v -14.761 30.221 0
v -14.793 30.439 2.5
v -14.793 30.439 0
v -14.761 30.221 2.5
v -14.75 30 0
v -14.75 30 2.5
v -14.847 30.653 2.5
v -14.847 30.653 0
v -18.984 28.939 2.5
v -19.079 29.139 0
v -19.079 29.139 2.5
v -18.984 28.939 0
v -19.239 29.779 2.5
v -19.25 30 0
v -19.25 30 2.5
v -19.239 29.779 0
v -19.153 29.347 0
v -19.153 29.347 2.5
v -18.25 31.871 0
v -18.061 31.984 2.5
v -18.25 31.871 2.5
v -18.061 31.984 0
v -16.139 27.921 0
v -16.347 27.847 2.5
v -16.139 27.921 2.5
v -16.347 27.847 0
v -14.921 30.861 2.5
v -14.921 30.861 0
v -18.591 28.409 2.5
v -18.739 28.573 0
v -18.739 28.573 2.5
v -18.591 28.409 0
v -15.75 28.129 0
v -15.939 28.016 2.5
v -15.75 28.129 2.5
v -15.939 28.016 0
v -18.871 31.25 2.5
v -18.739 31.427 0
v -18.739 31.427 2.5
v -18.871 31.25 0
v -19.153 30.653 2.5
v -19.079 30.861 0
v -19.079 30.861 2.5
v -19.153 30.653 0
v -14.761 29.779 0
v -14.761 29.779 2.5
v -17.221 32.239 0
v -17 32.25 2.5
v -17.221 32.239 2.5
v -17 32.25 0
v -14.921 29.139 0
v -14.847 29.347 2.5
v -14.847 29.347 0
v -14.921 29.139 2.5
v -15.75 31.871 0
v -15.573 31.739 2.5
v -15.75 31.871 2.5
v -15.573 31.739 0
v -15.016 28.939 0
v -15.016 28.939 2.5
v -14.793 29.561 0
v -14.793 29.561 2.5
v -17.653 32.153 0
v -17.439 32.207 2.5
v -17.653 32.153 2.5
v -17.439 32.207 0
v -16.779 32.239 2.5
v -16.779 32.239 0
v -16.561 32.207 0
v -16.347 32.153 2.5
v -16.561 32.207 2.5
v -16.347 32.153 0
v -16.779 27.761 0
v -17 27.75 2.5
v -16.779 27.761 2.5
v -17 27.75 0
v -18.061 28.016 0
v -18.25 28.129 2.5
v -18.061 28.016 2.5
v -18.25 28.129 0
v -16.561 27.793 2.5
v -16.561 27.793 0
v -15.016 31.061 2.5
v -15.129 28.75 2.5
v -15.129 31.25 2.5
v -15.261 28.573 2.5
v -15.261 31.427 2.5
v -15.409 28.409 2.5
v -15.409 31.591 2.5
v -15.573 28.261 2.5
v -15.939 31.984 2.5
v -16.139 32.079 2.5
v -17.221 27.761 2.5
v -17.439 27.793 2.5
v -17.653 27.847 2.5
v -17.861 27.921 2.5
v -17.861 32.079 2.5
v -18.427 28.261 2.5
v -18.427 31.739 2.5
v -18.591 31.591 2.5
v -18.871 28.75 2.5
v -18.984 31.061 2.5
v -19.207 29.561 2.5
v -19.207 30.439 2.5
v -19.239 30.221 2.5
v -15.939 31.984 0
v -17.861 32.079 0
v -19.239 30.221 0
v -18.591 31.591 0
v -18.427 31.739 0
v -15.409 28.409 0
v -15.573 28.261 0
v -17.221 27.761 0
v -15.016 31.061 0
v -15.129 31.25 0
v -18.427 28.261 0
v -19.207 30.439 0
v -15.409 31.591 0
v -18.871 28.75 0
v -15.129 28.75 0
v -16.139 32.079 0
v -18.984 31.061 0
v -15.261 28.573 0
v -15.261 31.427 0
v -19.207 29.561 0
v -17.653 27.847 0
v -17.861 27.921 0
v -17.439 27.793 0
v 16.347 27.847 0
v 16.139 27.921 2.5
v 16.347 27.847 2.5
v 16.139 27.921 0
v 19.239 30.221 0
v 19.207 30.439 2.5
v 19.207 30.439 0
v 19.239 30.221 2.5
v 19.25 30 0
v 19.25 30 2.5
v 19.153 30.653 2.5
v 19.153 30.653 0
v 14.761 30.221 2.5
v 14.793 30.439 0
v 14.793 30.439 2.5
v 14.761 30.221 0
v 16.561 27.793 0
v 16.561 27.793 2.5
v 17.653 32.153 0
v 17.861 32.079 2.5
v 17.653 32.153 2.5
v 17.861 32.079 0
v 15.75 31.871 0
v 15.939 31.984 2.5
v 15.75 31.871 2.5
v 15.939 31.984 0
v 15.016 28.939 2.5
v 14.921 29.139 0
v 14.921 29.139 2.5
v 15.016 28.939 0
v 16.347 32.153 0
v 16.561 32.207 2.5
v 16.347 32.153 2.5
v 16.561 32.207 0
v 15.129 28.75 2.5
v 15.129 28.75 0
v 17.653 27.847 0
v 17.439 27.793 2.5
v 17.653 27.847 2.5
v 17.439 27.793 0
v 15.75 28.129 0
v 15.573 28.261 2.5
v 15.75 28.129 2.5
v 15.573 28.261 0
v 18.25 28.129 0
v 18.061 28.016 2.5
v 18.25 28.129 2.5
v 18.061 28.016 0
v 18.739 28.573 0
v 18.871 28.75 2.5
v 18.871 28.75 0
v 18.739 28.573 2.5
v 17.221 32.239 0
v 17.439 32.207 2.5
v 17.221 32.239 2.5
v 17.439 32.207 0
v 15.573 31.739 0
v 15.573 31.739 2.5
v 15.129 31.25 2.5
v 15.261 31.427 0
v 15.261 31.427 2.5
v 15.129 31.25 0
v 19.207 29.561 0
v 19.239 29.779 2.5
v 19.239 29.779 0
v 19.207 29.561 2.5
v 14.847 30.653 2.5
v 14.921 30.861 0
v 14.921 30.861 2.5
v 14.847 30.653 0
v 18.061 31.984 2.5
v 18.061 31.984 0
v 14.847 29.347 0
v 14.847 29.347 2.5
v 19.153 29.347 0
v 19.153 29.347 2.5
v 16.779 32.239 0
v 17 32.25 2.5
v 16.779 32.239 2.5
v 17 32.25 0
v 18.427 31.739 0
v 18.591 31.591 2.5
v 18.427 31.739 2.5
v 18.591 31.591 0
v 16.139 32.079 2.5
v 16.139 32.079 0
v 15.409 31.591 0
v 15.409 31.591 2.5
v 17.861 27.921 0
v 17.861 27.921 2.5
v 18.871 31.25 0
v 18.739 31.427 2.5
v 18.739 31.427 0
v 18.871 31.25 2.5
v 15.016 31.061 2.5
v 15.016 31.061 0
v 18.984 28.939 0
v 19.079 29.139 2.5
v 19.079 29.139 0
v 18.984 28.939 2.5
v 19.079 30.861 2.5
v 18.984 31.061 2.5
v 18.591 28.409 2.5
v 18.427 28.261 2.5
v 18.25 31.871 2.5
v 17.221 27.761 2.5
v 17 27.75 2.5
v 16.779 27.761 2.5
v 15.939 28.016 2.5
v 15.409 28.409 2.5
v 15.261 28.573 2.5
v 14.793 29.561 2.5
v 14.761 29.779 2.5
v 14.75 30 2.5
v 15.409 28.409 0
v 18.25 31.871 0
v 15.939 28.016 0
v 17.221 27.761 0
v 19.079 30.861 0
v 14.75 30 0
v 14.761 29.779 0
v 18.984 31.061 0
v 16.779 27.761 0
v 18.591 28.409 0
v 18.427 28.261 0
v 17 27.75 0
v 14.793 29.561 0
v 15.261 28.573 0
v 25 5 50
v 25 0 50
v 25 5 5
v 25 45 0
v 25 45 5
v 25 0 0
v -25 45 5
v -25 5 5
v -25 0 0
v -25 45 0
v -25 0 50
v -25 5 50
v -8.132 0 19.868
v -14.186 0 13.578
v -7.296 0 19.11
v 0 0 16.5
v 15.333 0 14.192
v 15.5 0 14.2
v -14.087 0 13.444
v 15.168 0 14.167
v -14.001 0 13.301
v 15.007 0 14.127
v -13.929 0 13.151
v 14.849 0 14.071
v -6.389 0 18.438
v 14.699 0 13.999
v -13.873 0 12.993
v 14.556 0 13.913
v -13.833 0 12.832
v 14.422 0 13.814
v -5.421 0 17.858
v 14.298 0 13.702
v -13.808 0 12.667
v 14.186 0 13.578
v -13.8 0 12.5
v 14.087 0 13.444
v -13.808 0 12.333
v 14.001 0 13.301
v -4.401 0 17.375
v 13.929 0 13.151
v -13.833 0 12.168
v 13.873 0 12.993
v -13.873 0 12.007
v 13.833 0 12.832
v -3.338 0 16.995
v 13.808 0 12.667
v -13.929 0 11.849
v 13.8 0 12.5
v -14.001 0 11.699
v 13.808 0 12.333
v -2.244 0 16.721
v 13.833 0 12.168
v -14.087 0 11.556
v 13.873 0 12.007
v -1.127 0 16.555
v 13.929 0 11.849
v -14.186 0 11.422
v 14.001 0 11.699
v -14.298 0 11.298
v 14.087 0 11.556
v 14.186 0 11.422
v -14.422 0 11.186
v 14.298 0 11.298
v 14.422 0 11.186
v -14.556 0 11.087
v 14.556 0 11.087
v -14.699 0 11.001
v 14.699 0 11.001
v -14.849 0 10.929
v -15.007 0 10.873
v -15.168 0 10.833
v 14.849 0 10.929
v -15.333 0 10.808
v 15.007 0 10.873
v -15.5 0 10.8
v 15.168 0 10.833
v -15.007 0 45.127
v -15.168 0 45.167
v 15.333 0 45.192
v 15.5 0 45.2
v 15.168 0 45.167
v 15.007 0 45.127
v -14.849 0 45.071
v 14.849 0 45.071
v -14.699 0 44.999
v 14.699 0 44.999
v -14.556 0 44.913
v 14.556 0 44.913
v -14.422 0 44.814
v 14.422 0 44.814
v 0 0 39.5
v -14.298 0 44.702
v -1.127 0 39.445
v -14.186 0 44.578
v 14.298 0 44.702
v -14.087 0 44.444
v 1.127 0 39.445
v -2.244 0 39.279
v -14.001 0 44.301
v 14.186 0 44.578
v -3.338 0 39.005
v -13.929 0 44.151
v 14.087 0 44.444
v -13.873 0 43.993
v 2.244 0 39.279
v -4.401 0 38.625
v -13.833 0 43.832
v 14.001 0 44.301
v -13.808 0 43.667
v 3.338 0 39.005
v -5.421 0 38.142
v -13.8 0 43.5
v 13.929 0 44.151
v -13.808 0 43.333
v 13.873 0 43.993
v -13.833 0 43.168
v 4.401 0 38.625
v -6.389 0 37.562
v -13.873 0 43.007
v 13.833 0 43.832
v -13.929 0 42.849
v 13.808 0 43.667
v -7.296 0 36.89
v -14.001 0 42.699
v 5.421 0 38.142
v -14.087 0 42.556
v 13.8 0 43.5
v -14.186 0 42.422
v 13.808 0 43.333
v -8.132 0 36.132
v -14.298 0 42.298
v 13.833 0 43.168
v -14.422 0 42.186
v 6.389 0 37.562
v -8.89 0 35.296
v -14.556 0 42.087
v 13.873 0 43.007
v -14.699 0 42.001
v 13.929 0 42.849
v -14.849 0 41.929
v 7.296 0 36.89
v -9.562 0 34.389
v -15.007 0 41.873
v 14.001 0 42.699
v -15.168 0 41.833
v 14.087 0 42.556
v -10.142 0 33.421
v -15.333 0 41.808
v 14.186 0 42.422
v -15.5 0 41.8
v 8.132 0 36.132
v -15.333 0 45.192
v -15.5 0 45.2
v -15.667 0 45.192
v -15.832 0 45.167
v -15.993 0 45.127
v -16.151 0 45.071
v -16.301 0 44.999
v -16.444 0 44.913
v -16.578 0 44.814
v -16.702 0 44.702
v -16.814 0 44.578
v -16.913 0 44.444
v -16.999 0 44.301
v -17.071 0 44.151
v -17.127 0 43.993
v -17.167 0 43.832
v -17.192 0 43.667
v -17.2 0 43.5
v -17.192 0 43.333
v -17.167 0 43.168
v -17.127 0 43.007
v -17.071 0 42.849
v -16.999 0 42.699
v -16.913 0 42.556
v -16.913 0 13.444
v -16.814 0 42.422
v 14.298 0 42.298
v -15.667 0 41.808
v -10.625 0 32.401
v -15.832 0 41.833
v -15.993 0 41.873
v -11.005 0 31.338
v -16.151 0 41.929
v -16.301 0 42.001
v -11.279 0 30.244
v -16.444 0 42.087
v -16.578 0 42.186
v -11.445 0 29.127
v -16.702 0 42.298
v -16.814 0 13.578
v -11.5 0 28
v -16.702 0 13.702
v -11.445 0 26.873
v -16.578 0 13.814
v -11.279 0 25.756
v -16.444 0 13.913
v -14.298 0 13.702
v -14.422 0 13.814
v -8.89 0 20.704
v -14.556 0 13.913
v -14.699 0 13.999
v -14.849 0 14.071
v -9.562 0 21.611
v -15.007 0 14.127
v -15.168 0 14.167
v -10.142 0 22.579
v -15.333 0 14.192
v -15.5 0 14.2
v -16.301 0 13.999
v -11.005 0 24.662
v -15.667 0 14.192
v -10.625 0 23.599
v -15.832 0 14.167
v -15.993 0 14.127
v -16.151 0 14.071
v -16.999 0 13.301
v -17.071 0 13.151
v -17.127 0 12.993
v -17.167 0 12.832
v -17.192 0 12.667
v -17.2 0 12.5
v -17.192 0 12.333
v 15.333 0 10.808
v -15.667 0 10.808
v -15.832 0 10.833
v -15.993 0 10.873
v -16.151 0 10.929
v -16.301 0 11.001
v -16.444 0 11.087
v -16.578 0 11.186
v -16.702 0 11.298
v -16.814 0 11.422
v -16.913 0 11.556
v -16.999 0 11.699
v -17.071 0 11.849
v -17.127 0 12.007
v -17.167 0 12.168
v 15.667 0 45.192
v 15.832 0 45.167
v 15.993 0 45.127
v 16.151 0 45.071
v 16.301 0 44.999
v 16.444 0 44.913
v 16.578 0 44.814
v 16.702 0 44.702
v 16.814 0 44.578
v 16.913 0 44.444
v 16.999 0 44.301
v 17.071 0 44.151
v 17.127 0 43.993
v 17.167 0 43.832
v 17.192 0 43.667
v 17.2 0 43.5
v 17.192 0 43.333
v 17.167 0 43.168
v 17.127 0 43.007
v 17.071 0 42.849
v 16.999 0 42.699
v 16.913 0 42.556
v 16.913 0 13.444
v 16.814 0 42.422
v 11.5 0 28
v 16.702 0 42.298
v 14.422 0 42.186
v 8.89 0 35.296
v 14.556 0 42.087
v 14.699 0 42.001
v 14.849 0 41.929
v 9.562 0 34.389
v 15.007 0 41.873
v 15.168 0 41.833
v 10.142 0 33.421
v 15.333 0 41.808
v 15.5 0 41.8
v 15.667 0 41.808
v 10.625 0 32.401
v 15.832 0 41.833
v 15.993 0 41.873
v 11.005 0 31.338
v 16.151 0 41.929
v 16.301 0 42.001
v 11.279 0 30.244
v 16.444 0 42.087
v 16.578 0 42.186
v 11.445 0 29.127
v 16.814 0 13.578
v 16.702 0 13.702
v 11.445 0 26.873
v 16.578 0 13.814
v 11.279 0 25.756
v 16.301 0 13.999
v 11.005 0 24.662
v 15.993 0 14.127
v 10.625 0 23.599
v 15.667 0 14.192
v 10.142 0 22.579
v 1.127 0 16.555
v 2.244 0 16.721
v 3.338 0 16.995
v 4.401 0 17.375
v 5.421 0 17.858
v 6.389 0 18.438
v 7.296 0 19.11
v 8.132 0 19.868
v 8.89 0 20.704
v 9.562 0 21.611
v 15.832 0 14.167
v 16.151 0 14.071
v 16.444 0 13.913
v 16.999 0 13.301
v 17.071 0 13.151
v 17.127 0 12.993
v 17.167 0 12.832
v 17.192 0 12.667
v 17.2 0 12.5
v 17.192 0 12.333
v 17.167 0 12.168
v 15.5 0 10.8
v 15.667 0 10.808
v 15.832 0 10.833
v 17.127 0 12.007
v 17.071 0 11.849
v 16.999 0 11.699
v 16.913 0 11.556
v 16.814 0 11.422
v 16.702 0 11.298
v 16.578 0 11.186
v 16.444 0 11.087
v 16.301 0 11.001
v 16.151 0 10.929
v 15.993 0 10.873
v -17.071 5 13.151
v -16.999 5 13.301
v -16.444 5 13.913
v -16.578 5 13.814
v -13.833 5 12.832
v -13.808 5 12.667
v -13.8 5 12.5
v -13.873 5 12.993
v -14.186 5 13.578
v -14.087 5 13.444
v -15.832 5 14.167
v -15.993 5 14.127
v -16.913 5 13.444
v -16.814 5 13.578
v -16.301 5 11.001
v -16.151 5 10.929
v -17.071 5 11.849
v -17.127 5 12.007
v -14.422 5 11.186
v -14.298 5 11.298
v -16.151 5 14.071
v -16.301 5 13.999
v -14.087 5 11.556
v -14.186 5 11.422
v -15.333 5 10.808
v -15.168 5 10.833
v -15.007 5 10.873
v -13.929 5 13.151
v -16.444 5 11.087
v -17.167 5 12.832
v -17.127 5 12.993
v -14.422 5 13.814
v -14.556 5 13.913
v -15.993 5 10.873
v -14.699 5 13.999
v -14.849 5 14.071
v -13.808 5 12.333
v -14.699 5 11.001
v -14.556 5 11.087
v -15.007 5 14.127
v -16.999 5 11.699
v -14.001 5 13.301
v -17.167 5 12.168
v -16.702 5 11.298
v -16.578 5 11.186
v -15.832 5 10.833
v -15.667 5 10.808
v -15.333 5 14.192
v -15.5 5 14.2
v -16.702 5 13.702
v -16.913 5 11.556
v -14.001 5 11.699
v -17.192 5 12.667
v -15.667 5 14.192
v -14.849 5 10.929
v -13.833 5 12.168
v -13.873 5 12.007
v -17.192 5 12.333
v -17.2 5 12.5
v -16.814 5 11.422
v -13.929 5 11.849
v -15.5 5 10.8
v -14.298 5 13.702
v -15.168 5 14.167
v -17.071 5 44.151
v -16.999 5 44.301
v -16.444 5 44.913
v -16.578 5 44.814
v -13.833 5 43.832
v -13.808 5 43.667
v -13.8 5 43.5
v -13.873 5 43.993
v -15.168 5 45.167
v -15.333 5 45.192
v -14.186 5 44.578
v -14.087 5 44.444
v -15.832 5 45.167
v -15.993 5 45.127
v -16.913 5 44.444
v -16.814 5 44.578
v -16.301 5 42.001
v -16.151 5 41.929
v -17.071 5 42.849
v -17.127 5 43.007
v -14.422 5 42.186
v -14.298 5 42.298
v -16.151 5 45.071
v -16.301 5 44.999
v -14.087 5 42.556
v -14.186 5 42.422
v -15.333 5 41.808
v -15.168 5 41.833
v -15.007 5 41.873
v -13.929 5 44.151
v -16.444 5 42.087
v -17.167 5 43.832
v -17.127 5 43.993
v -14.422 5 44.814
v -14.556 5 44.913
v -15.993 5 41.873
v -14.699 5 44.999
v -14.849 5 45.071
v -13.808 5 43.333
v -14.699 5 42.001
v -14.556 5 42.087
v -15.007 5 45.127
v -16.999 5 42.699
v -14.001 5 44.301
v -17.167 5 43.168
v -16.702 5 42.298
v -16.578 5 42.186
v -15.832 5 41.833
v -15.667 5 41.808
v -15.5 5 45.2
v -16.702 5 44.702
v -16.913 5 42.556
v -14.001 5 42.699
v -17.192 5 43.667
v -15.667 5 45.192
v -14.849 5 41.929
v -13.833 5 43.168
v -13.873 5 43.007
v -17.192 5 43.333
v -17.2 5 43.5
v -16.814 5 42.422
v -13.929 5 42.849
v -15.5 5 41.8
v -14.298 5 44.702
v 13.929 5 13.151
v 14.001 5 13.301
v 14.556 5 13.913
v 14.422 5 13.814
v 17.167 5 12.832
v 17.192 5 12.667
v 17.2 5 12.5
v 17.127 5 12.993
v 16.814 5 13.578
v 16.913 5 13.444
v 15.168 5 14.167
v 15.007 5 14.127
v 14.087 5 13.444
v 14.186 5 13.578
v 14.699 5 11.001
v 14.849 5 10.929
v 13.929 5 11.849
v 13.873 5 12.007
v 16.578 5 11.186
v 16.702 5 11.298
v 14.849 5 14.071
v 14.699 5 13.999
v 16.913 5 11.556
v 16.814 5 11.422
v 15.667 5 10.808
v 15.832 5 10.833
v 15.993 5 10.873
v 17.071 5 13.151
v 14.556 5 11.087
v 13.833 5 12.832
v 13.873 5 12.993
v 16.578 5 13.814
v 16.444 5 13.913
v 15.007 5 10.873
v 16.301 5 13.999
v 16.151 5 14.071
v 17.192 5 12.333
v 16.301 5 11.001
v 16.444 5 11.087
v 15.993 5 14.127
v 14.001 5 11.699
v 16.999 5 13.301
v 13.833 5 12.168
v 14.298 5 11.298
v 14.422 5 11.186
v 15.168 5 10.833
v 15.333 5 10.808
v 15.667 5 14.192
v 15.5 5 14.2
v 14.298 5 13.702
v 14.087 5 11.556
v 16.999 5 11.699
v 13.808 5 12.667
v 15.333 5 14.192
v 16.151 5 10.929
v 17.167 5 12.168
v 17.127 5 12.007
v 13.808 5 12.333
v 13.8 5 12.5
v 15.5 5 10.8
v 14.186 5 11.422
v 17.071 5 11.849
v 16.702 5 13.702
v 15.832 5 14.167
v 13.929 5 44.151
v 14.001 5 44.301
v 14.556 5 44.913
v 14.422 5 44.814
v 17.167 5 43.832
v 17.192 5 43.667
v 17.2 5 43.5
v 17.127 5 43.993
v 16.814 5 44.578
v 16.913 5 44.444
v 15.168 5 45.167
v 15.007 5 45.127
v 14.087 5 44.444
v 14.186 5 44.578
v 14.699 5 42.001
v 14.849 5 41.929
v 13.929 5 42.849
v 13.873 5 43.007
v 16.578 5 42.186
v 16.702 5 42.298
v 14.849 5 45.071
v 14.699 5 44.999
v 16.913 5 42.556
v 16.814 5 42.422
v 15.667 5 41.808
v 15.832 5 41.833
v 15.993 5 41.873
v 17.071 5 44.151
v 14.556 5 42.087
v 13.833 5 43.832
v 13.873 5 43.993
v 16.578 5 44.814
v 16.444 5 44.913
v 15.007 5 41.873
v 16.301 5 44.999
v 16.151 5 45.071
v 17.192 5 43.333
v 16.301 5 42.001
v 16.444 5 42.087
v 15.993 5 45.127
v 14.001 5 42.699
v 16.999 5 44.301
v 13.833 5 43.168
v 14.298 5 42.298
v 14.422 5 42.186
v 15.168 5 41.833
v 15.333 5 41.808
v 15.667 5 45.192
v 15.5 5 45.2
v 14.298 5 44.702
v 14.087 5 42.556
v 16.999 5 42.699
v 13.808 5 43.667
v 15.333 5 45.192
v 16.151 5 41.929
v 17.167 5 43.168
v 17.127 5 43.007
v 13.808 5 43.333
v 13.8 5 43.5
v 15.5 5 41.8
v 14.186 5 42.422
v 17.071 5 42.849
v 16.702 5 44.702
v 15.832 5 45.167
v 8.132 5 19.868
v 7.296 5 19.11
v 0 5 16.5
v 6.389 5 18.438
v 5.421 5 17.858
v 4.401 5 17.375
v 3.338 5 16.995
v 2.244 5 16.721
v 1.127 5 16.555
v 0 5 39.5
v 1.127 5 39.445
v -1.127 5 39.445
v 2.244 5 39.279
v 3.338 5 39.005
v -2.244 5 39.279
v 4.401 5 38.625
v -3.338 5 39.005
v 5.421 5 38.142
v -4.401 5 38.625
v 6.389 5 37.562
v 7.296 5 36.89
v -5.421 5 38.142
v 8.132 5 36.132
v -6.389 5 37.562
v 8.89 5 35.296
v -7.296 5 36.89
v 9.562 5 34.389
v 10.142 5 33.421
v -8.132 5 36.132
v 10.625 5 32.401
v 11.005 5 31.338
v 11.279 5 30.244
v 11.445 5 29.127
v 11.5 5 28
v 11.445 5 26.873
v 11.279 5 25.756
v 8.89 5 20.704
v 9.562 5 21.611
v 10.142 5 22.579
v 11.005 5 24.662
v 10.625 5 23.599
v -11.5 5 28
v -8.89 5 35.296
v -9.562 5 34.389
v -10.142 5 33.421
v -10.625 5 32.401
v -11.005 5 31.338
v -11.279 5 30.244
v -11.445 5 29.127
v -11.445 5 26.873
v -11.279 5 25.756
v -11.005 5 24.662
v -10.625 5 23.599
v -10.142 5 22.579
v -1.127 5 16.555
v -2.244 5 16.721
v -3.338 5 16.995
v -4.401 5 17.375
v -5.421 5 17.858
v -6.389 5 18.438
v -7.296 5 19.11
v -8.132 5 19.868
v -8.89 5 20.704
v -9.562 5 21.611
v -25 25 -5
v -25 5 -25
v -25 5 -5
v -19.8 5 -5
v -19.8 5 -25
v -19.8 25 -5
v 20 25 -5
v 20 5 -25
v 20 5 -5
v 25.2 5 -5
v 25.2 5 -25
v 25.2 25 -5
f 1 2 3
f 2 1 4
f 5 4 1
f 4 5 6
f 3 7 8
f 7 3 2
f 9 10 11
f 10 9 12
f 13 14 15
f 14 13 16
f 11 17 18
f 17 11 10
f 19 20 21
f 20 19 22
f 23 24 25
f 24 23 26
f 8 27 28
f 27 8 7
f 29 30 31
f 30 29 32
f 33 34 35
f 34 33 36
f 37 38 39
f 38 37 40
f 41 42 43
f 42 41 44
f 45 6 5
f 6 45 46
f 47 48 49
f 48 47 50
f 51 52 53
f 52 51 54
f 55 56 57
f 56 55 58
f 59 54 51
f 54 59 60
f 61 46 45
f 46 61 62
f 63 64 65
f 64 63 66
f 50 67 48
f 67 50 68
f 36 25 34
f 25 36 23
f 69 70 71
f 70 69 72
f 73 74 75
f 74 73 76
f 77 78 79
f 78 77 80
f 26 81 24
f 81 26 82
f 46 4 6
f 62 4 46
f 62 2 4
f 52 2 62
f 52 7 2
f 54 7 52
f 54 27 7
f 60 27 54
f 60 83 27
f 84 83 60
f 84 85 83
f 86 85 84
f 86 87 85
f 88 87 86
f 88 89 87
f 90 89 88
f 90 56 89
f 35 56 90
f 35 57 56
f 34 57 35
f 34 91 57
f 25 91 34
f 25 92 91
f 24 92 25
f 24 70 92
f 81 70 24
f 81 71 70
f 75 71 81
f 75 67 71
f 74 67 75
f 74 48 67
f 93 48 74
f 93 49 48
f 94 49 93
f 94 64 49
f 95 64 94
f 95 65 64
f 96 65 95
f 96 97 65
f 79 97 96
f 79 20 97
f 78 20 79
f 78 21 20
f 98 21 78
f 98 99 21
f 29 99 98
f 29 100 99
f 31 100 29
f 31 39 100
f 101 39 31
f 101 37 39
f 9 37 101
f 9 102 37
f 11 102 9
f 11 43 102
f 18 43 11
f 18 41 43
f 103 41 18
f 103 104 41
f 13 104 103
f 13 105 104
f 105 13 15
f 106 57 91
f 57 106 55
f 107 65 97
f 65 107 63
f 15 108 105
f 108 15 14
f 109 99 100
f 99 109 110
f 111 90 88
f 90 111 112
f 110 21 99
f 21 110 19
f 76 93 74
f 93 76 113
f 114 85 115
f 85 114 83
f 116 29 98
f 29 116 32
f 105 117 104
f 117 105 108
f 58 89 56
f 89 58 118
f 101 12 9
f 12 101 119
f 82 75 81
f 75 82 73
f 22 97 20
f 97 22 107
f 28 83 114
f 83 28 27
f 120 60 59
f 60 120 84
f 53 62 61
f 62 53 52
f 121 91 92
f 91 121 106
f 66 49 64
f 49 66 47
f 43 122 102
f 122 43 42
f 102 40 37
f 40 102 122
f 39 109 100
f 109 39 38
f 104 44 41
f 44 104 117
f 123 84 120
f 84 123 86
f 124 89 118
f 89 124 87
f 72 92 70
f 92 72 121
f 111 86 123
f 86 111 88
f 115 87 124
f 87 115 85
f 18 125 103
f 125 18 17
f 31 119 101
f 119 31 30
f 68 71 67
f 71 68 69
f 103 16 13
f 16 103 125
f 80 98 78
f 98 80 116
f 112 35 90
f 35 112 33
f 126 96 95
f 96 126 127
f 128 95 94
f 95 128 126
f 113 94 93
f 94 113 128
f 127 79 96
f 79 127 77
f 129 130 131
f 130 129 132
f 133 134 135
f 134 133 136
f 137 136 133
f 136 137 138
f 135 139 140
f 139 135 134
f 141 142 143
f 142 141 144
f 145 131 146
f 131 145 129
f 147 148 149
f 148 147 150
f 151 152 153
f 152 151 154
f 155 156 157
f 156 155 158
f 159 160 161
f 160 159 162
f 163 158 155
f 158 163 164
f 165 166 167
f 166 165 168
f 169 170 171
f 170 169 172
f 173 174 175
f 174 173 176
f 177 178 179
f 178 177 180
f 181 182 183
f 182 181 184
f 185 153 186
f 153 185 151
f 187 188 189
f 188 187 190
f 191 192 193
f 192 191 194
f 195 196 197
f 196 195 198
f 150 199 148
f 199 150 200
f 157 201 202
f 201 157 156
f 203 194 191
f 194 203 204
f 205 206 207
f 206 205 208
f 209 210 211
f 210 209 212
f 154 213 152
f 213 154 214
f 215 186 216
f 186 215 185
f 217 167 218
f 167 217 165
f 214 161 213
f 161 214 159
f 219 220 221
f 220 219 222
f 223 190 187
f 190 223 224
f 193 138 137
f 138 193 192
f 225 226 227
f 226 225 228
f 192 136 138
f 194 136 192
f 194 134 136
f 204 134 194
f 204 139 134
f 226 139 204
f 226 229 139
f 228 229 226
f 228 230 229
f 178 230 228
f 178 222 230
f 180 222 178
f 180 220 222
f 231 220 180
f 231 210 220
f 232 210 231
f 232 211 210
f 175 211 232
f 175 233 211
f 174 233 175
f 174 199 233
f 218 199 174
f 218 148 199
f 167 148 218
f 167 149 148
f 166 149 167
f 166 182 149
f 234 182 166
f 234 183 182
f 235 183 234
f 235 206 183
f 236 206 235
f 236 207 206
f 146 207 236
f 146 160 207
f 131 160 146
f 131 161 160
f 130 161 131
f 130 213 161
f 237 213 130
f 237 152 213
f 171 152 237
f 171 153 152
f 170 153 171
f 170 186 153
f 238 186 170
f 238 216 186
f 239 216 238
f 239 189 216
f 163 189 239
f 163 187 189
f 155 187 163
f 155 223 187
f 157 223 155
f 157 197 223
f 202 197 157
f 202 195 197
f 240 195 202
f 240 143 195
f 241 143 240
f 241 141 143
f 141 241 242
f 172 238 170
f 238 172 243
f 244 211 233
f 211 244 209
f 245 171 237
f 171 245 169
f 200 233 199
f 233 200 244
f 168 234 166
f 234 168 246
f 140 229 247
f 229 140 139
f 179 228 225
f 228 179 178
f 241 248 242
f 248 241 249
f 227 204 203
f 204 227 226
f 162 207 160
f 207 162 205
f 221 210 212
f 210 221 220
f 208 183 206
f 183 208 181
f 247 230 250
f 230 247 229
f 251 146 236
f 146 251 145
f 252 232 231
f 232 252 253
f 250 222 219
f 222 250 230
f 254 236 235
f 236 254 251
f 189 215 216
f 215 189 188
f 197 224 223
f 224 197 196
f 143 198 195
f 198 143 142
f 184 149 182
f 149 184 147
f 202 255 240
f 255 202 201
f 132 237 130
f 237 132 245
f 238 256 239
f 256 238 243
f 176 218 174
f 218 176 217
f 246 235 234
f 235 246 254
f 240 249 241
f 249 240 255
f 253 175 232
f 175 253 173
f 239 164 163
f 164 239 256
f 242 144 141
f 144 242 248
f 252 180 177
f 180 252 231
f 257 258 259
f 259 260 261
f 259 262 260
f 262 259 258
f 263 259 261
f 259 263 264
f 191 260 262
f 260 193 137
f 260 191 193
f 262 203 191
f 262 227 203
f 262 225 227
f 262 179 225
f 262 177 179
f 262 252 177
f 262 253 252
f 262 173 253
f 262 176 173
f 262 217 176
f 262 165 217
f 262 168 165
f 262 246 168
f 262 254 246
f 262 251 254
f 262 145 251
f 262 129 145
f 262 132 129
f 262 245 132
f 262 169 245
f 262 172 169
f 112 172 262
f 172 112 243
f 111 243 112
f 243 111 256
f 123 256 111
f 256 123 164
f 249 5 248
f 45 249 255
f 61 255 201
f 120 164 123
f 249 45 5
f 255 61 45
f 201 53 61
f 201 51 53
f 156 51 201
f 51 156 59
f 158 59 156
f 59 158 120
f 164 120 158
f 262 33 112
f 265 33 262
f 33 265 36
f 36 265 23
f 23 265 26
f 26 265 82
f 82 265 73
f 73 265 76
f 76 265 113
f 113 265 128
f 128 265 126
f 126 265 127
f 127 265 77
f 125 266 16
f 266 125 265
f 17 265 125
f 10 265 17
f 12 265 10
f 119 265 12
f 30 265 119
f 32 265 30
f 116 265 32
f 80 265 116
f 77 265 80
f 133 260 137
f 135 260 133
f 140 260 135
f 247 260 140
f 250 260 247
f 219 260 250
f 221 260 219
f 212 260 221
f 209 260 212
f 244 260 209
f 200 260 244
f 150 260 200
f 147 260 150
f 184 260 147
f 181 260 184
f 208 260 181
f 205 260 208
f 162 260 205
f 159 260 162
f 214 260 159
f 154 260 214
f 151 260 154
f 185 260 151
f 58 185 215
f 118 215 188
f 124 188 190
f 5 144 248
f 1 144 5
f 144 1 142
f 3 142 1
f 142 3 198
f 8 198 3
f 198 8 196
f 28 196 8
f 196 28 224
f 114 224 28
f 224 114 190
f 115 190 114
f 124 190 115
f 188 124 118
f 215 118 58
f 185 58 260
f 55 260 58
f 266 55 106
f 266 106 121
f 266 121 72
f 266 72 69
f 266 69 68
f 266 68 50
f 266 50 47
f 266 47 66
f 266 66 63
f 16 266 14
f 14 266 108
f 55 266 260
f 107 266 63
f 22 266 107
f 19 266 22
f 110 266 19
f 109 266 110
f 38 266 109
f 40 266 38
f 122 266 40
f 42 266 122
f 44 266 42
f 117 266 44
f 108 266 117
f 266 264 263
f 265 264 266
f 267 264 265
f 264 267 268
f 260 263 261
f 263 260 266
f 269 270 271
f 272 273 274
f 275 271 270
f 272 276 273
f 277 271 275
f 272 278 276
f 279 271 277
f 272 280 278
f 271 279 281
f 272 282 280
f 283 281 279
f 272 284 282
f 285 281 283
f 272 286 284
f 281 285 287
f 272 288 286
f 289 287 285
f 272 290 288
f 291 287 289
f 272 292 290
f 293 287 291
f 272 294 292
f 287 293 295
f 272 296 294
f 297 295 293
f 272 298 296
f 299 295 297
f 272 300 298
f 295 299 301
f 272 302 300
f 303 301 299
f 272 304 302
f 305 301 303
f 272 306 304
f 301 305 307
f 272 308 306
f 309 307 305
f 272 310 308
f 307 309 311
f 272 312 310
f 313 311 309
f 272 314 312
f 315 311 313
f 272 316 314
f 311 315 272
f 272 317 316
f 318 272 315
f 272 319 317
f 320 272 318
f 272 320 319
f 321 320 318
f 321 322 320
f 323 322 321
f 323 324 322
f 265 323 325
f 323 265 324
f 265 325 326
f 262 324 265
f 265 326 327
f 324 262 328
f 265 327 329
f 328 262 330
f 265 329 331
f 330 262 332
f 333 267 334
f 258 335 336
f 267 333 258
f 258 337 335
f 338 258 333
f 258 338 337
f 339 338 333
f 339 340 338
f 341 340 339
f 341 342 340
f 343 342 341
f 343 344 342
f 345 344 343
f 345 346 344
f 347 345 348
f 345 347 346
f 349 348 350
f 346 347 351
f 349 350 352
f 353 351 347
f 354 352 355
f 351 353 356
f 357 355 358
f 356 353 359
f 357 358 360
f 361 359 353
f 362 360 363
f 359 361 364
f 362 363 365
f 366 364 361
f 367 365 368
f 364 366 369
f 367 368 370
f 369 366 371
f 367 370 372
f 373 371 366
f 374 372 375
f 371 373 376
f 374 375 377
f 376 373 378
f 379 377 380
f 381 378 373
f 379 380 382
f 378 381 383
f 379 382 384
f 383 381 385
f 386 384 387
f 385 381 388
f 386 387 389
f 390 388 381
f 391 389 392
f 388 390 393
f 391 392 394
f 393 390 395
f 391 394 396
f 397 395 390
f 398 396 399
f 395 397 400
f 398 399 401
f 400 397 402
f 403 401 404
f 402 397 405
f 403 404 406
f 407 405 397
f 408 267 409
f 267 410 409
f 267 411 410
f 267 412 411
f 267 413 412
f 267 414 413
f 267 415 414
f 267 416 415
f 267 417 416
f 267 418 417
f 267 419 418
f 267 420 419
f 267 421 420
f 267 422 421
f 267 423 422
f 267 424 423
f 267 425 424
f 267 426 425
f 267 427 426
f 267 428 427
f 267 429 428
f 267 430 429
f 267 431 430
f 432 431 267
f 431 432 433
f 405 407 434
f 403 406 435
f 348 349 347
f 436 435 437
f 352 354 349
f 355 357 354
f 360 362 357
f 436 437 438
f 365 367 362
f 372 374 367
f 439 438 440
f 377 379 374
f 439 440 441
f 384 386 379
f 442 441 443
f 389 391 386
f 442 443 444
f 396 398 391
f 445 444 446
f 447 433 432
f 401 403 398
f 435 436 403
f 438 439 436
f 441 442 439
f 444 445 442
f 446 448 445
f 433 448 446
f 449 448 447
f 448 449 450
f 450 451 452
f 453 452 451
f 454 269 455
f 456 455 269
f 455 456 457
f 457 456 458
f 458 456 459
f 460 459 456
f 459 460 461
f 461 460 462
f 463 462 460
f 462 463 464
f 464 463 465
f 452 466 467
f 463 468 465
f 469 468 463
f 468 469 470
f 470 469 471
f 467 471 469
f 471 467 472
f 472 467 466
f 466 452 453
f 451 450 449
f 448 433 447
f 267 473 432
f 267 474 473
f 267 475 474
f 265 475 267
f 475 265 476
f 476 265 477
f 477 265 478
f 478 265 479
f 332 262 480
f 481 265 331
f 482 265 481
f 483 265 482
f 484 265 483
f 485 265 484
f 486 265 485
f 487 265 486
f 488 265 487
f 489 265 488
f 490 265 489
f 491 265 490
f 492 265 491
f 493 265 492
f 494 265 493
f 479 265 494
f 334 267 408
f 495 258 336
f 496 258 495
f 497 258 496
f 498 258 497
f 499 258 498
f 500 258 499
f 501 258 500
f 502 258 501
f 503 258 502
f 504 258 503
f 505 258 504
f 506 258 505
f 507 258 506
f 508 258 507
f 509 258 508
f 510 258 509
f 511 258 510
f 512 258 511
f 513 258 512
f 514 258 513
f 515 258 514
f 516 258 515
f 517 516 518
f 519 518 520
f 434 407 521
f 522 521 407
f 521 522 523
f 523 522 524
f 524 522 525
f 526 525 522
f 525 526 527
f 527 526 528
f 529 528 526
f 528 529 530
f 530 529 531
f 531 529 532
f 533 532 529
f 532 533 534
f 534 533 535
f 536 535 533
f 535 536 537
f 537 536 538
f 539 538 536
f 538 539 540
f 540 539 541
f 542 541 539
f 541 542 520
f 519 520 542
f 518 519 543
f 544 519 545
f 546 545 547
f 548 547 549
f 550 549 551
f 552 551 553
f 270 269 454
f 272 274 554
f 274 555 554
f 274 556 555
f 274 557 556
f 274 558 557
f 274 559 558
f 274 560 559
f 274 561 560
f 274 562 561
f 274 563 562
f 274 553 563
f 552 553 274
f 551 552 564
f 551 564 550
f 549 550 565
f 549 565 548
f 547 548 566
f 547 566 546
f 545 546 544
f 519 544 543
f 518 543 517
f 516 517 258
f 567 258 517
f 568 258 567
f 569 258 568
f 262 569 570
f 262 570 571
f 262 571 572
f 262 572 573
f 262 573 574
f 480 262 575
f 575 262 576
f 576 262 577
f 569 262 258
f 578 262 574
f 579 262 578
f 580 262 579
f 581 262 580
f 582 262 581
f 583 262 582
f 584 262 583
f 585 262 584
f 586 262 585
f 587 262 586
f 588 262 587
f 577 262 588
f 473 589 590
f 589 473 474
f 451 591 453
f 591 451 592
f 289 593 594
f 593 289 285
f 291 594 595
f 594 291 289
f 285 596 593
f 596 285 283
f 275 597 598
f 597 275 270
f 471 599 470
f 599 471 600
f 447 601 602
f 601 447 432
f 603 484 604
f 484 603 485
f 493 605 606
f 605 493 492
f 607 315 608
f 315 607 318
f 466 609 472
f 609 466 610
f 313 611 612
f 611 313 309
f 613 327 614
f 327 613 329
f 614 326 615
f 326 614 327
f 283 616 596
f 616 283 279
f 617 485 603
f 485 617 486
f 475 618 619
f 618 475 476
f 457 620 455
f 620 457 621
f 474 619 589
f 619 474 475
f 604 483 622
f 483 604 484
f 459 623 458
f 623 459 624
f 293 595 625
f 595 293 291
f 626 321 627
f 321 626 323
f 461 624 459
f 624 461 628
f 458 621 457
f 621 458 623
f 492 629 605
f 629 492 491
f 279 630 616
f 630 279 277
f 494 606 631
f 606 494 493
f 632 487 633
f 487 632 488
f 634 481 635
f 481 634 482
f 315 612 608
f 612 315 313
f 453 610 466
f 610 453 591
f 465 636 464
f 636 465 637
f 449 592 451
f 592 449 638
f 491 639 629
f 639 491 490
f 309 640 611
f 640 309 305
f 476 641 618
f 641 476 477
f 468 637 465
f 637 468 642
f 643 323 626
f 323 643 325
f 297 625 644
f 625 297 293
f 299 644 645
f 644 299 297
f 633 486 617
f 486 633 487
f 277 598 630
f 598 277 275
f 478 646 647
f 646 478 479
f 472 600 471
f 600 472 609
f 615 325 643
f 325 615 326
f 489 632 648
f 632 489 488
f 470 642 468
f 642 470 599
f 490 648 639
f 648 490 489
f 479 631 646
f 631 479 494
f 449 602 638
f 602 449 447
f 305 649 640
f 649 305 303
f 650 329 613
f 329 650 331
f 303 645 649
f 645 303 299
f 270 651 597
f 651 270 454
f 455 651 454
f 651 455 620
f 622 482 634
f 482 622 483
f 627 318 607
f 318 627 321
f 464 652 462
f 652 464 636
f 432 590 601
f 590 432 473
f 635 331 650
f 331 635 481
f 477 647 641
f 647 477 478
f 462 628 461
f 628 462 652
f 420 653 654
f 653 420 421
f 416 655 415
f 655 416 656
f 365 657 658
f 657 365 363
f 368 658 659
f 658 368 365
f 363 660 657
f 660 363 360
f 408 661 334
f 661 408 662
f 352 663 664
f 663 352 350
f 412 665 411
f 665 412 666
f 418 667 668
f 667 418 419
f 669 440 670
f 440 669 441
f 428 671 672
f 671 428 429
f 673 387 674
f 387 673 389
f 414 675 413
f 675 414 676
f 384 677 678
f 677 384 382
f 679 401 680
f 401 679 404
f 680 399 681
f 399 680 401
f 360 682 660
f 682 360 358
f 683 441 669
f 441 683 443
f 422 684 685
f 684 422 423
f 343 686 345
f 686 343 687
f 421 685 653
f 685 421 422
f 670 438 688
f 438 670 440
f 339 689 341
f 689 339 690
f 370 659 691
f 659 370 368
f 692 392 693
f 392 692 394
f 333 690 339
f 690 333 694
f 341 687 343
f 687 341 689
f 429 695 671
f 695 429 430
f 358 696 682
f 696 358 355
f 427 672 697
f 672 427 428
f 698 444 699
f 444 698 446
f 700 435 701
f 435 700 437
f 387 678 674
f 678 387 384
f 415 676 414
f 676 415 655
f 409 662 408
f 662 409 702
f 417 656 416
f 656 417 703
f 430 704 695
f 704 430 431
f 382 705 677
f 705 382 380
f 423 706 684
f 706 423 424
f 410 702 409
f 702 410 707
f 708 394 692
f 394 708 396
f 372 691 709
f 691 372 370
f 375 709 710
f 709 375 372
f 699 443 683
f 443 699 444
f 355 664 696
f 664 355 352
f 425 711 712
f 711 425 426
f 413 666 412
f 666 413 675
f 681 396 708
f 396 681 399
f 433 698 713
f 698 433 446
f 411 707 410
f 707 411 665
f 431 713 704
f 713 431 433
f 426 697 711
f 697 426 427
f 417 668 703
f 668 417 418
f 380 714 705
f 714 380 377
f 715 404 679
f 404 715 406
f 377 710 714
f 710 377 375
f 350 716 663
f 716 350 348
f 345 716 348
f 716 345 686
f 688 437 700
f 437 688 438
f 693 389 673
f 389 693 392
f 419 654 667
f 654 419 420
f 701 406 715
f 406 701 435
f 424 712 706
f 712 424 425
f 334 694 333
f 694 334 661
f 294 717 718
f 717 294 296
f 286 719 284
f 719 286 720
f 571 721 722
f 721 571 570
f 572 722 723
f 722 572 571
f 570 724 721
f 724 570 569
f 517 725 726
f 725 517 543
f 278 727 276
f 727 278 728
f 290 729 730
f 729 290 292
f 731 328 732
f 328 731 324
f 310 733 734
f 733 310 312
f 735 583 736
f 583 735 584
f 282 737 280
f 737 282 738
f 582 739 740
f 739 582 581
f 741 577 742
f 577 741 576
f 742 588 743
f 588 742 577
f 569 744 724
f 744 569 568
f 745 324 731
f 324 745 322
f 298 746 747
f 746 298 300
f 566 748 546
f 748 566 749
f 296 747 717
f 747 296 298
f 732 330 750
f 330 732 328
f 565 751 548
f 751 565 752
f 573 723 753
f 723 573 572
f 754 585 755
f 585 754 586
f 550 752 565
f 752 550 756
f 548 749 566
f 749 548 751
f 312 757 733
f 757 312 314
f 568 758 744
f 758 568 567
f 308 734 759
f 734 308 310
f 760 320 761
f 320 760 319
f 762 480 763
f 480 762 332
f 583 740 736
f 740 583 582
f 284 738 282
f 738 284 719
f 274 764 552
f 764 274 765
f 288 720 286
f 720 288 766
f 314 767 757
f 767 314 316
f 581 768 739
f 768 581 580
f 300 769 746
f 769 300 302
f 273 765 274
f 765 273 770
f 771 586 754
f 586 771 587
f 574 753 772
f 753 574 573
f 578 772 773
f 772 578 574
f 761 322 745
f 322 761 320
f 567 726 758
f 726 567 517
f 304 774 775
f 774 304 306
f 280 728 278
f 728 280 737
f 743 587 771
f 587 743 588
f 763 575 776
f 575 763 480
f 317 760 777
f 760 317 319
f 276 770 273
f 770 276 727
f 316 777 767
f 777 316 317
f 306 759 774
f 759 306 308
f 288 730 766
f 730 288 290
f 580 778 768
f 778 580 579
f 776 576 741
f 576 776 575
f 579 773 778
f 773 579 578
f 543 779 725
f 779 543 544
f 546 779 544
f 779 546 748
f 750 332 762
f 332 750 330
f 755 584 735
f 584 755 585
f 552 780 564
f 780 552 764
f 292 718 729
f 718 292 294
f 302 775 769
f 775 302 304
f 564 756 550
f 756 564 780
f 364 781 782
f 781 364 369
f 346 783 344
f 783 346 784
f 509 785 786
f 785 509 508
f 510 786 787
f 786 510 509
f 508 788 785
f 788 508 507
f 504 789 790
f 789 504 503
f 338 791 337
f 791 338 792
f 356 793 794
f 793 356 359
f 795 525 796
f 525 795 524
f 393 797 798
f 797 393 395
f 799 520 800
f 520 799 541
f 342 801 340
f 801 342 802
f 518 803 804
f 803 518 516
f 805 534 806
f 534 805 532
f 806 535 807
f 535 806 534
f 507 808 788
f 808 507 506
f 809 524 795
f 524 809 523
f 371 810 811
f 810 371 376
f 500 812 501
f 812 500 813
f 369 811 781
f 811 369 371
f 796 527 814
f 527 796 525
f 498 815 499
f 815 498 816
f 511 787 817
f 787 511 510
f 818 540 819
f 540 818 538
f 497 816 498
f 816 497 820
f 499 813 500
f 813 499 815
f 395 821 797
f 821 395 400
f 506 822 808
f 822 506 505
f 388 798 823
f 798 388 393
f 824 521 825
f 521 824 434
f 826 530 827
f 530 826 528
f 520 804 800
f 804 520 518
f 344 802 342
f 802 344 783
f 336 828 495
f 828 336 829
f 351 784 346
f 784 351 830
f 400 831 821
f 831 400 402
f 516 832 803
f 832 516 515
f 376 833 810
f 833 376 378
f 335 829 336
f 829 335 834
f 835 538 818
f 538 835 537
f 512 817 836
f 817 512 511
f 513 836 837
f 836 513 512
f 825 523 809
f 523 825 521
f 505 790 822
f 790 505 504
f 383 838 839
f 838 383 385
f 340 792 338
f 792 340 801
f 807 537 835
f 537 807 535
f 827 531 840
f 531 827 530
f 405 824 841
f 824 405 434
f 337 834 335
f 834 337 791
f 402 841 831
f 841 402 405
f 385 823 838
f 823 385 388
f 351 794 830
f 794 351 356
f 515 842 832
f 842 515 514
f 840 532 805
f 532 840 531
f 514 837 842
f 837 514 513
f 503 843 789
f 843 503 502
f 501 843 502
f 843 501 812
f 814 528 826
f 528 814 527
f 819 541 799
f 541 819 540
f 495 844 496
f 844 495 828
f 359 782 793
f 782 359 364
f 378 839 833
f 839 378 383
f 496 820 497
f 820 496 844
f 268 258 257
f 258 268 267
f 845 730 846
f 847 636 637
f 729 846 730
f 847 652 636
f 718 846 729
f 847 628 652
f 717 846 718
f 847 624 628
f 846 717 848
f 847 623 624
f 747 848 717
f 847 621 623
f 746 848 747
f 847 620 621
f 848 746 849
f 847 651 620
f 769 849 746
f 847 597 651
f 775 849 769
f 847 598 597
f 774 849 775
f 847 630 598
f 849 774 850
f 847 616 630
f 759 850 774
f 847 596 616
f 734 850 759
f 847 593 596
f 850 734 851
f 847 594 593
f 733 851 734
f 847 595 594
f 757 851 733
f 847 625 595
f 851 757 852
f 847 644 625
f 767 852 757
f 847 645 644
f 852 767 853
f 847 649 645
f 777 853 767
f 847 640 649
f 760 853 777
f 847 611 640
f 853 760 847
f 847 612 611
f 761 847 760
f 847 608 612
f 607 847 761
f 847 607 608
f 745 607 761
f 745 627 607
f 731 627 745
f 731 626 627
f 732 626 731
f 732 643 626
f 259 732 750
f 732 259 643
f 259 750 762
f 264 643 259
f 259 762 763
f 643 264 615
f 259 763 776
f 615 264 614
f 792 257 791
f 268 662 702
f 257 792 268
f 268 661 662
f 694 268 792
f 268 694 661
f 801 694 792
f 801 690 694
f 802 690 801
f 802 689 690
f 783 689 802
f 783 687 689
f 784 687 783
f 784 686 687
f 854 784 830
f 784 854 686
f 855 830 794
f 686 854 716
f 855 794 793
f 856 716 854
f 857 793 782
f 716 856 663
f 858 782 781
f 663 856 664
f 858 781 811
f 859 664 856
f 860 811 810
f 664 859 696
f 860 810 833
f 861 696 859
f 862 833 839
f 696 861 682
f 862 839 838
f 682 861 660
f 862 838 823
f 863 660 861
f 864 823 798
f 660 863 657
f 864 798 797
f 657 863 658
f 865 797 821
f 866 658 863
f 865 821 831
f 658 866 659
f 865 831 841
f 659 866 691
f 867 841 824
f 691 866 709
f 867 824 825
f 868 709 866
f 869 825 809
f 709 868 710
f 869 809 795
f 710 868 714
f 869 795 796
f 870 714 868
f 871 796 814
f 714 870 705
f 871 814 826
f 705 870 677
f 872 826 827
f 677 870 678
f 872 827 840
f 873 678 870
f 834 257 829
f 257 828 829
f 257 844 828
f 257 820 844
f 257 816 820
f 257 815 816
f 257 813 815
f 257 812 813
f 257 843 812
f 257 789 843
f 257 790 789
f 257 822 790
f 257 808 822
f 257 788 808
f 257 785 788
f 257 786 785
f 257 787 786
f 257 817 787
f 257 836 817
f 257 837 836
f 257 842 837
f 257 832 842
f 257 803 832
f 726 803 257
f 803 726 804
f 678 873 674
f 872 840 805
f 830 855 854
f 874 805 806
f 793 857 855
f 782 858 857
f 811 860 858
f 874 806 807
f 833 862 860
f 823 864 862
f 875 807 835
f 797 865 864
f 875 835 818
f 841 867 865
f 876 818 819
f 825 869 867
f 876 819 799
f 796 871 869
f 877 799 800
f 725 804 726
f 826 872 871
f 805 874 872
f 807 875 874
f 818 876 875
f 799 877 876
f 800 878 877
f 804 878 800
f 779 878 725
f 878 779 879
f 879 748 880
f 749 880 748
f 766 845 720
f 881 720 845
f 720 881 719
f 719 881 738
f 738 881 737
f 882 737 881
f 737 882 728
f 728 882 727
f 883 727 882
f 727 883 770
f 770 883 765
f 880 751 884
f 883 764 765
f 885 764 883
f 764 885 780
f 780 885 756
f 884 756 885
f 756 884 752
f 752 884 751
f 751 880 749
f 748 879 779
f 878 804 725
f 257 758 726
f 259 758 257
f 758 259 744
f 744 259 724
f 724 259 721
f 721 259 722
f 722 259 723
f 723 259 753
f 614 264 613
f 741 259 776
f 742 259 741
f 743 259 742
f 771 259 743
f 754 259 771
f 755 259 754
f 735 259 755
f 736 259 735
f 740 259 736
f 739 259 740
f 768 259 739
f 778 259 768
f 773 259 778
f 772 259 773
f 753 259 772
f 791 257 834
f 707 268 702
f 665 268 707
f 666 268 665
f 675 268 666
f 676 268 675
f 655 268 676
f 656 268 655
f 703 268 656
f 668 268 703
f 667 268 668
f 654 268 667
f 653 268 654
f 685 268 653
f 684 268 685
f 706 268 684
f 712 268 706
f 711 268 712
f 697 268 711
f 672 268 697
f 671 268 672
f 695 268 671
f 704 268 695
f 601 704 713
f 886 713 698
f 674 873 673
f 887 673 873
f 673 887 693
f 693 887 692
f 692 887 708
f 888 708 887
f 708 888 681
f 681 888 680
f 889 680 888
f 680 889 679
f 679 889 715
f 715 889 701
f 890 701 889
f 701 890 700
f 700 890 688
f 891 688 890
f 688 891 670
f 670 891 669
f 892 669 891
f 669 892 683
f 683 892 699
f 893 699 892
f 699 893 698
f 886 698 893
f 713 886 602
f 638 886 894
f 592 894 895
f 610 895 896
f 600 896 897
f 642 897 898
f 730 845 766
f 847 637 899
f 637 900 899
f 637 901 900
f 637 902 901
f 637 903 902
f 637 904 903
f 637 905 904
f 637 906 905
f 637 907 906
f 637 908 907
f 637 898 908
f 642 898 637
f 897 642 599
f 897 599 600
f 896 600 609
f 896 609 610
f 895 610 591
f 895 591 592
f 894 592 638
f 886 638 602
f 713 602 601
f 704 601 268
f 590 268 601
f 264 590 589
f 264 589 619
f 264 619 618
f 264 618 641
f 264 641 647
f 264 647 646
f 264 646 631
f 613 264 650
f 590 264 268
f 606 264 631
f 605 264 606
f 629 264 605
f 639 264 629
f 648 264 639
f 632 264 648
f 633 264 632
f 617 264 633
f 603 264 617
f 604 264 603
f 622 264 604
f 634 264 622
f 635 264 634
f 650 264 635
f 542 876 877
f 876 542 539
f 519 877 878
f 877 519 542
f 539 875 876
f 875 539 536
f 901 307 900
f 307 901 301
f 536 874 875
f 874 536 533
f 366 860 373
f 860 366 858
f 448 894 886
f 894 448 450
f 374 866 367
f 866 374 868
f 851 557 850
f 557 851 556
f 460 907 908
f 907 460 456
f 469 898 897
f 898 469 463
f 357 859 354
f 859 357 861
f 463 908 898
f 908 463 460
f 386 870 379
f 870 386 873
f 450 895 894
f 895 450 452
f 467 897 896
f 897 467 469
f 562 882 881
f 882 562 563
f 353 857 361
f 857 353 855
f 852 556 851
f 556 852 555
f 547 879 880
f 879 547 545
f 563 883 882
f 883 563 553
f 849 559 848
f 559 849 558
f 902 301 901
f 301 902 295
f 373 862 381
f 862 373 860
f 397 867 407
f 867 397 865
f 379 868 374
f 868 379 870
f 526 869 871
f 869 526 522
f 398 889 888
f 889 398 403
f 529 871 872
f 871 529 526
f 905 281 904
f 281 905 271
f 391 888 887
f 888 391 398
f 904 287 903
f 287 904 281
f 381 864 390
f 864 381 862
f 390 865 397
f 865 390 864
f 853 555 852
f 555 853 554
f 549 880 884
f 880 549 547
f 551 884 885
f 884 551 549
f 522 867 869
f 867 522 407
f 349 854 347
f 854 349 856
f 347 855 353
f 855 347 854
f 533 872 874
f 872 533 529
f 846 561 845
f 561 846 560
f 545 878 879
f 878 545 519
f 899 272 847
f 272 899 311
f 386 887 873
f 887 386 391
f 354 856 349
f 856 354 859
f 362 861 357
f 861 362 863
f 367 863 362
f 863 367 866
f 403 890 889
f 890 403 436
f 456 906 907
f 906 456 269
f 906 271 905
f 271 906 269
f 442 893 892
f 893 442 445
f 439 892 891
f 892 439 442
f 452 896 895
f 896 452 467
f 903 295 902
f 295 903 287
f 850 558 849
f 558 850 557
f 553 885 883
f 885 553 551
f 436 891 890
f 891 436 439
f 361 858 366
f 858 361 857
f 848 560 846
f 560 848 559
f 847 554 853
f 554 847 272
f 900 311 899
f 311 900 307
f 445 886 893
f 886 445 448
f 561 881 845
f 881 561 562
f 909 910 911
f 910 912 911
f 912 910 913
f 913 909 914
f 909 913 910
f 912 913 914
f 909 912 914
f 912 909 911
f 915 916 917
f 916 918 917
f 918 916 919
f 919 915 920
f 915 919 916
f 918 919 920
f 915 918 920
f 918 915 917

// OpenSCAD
//--------------------
// Parameters
//--------------------
base_x = 50;               // total width of base plate (x: -25 to 25)
base_y = 45;               // length of base plate (y: 0 to 45)
base_z = 5;                // thickness of base plate (z: 0 to 5)

m4_dia = 4.5;             // M4 hole diameter
m4_radius = m4_dia/2;
m4_extend = 0.2;          // extra length beyond faces for clean cut

motor_y = 5;               // thickness of motor plate in Y direction
motor_z = 50;              // height of motor plate in Z direction

boss_dia = 23;             // motor centring boss hole diameter
boss_radius = boss_dia/2;
boss_extend = 0.2;         // extra length beyond faces for clean cut

m3_dia = 3.4;              // M3 screw hole diameter
m3_radius = m3_dia/2;
m3_extend = 0.2;           // extra length beyond faces for clean cut

gusset_thick = 5;          // thickness of gussets (in X)
gusset_leg = 20;           // leg length of right‑triangle in Y and Z
gusset_extend = 0.2;       // extra length beyond faces for clean cut

//--------------------
// Geometry
//--------------------
$fn = 64;

// Base plate with M4 holes (vertical through Z)
module base_plate() {
    difference() {
        // solid block
        translate([-base_x/2, 0, 0])
            cube([base_x, base_y, base_z], center = false);
        // M4 holes
        for (pos = [[-17, 30], [17, 30]]) {
            translate([pos[0], pos[1], -m4_extend])
                cylinder(r = m4_radius,
                         h = base_z + 2*m4_extend,
                         center = true);
        }
    }
}

// Motor plate with boss hole and M3 screw holes (cut along Y)
module motor_plate() {
    difference() {
        // solid block
        translate([-base_x/2, 0, 0])
            cube([base_x, motor_y, motor_z], center = false);
        // Boss hole (cylinder along Y)
        translate([0, motor_y/2, 28])
            rotate([90,0,0])
                cylinder(r = boss_radius,
                         h = motor_y + 2*boss_extend,
                         center = true);
        // Four M3 holes (cylinder along Y)
        for (dx = [-15.5, 15.5])
            for (dz = [12.5, 43.5])
                translate([dx, motor_y/2, dz])
                    rotate([90,0,0])
                        cylinder(r = m3_radius,
                                 h = motor_y + 2*m3_extend,
                                 center = true);
    }
}

// Single triangular gusset (right‑triangle in YZ, extruded in X)
module triangular_gusset() {
    // 2‑D right triangle in YZ plane, right‑angle at (5,5)
    rotate([0,90,0])                     // rotate extruded shape so thickness points in +X
        linear_extrude(height = gusset_thick + gusset_extend)
            polygon(points = [[5,5],
                               [5+gusset_leg,5],
                               [5,5+gusset_leg]]);
}

// Left gusset (flush with x = -25 edge)
module left_gusset() {
    translate([-25, 0, 0])   // shift from 0..5 to -25..-20
        triangular_gusset();
}

// Right gusset (flush with x = 25 edge)
module right_gusset() {
    translate([20, 0, 0])    // shift from 0..5 to 20..25
        triangular_gusset();
}

//--------------------
// Assembly
//--------------------
union() {
    base_plate();
    motor_plate();
    left_gusset();
    right_gusset();
}
